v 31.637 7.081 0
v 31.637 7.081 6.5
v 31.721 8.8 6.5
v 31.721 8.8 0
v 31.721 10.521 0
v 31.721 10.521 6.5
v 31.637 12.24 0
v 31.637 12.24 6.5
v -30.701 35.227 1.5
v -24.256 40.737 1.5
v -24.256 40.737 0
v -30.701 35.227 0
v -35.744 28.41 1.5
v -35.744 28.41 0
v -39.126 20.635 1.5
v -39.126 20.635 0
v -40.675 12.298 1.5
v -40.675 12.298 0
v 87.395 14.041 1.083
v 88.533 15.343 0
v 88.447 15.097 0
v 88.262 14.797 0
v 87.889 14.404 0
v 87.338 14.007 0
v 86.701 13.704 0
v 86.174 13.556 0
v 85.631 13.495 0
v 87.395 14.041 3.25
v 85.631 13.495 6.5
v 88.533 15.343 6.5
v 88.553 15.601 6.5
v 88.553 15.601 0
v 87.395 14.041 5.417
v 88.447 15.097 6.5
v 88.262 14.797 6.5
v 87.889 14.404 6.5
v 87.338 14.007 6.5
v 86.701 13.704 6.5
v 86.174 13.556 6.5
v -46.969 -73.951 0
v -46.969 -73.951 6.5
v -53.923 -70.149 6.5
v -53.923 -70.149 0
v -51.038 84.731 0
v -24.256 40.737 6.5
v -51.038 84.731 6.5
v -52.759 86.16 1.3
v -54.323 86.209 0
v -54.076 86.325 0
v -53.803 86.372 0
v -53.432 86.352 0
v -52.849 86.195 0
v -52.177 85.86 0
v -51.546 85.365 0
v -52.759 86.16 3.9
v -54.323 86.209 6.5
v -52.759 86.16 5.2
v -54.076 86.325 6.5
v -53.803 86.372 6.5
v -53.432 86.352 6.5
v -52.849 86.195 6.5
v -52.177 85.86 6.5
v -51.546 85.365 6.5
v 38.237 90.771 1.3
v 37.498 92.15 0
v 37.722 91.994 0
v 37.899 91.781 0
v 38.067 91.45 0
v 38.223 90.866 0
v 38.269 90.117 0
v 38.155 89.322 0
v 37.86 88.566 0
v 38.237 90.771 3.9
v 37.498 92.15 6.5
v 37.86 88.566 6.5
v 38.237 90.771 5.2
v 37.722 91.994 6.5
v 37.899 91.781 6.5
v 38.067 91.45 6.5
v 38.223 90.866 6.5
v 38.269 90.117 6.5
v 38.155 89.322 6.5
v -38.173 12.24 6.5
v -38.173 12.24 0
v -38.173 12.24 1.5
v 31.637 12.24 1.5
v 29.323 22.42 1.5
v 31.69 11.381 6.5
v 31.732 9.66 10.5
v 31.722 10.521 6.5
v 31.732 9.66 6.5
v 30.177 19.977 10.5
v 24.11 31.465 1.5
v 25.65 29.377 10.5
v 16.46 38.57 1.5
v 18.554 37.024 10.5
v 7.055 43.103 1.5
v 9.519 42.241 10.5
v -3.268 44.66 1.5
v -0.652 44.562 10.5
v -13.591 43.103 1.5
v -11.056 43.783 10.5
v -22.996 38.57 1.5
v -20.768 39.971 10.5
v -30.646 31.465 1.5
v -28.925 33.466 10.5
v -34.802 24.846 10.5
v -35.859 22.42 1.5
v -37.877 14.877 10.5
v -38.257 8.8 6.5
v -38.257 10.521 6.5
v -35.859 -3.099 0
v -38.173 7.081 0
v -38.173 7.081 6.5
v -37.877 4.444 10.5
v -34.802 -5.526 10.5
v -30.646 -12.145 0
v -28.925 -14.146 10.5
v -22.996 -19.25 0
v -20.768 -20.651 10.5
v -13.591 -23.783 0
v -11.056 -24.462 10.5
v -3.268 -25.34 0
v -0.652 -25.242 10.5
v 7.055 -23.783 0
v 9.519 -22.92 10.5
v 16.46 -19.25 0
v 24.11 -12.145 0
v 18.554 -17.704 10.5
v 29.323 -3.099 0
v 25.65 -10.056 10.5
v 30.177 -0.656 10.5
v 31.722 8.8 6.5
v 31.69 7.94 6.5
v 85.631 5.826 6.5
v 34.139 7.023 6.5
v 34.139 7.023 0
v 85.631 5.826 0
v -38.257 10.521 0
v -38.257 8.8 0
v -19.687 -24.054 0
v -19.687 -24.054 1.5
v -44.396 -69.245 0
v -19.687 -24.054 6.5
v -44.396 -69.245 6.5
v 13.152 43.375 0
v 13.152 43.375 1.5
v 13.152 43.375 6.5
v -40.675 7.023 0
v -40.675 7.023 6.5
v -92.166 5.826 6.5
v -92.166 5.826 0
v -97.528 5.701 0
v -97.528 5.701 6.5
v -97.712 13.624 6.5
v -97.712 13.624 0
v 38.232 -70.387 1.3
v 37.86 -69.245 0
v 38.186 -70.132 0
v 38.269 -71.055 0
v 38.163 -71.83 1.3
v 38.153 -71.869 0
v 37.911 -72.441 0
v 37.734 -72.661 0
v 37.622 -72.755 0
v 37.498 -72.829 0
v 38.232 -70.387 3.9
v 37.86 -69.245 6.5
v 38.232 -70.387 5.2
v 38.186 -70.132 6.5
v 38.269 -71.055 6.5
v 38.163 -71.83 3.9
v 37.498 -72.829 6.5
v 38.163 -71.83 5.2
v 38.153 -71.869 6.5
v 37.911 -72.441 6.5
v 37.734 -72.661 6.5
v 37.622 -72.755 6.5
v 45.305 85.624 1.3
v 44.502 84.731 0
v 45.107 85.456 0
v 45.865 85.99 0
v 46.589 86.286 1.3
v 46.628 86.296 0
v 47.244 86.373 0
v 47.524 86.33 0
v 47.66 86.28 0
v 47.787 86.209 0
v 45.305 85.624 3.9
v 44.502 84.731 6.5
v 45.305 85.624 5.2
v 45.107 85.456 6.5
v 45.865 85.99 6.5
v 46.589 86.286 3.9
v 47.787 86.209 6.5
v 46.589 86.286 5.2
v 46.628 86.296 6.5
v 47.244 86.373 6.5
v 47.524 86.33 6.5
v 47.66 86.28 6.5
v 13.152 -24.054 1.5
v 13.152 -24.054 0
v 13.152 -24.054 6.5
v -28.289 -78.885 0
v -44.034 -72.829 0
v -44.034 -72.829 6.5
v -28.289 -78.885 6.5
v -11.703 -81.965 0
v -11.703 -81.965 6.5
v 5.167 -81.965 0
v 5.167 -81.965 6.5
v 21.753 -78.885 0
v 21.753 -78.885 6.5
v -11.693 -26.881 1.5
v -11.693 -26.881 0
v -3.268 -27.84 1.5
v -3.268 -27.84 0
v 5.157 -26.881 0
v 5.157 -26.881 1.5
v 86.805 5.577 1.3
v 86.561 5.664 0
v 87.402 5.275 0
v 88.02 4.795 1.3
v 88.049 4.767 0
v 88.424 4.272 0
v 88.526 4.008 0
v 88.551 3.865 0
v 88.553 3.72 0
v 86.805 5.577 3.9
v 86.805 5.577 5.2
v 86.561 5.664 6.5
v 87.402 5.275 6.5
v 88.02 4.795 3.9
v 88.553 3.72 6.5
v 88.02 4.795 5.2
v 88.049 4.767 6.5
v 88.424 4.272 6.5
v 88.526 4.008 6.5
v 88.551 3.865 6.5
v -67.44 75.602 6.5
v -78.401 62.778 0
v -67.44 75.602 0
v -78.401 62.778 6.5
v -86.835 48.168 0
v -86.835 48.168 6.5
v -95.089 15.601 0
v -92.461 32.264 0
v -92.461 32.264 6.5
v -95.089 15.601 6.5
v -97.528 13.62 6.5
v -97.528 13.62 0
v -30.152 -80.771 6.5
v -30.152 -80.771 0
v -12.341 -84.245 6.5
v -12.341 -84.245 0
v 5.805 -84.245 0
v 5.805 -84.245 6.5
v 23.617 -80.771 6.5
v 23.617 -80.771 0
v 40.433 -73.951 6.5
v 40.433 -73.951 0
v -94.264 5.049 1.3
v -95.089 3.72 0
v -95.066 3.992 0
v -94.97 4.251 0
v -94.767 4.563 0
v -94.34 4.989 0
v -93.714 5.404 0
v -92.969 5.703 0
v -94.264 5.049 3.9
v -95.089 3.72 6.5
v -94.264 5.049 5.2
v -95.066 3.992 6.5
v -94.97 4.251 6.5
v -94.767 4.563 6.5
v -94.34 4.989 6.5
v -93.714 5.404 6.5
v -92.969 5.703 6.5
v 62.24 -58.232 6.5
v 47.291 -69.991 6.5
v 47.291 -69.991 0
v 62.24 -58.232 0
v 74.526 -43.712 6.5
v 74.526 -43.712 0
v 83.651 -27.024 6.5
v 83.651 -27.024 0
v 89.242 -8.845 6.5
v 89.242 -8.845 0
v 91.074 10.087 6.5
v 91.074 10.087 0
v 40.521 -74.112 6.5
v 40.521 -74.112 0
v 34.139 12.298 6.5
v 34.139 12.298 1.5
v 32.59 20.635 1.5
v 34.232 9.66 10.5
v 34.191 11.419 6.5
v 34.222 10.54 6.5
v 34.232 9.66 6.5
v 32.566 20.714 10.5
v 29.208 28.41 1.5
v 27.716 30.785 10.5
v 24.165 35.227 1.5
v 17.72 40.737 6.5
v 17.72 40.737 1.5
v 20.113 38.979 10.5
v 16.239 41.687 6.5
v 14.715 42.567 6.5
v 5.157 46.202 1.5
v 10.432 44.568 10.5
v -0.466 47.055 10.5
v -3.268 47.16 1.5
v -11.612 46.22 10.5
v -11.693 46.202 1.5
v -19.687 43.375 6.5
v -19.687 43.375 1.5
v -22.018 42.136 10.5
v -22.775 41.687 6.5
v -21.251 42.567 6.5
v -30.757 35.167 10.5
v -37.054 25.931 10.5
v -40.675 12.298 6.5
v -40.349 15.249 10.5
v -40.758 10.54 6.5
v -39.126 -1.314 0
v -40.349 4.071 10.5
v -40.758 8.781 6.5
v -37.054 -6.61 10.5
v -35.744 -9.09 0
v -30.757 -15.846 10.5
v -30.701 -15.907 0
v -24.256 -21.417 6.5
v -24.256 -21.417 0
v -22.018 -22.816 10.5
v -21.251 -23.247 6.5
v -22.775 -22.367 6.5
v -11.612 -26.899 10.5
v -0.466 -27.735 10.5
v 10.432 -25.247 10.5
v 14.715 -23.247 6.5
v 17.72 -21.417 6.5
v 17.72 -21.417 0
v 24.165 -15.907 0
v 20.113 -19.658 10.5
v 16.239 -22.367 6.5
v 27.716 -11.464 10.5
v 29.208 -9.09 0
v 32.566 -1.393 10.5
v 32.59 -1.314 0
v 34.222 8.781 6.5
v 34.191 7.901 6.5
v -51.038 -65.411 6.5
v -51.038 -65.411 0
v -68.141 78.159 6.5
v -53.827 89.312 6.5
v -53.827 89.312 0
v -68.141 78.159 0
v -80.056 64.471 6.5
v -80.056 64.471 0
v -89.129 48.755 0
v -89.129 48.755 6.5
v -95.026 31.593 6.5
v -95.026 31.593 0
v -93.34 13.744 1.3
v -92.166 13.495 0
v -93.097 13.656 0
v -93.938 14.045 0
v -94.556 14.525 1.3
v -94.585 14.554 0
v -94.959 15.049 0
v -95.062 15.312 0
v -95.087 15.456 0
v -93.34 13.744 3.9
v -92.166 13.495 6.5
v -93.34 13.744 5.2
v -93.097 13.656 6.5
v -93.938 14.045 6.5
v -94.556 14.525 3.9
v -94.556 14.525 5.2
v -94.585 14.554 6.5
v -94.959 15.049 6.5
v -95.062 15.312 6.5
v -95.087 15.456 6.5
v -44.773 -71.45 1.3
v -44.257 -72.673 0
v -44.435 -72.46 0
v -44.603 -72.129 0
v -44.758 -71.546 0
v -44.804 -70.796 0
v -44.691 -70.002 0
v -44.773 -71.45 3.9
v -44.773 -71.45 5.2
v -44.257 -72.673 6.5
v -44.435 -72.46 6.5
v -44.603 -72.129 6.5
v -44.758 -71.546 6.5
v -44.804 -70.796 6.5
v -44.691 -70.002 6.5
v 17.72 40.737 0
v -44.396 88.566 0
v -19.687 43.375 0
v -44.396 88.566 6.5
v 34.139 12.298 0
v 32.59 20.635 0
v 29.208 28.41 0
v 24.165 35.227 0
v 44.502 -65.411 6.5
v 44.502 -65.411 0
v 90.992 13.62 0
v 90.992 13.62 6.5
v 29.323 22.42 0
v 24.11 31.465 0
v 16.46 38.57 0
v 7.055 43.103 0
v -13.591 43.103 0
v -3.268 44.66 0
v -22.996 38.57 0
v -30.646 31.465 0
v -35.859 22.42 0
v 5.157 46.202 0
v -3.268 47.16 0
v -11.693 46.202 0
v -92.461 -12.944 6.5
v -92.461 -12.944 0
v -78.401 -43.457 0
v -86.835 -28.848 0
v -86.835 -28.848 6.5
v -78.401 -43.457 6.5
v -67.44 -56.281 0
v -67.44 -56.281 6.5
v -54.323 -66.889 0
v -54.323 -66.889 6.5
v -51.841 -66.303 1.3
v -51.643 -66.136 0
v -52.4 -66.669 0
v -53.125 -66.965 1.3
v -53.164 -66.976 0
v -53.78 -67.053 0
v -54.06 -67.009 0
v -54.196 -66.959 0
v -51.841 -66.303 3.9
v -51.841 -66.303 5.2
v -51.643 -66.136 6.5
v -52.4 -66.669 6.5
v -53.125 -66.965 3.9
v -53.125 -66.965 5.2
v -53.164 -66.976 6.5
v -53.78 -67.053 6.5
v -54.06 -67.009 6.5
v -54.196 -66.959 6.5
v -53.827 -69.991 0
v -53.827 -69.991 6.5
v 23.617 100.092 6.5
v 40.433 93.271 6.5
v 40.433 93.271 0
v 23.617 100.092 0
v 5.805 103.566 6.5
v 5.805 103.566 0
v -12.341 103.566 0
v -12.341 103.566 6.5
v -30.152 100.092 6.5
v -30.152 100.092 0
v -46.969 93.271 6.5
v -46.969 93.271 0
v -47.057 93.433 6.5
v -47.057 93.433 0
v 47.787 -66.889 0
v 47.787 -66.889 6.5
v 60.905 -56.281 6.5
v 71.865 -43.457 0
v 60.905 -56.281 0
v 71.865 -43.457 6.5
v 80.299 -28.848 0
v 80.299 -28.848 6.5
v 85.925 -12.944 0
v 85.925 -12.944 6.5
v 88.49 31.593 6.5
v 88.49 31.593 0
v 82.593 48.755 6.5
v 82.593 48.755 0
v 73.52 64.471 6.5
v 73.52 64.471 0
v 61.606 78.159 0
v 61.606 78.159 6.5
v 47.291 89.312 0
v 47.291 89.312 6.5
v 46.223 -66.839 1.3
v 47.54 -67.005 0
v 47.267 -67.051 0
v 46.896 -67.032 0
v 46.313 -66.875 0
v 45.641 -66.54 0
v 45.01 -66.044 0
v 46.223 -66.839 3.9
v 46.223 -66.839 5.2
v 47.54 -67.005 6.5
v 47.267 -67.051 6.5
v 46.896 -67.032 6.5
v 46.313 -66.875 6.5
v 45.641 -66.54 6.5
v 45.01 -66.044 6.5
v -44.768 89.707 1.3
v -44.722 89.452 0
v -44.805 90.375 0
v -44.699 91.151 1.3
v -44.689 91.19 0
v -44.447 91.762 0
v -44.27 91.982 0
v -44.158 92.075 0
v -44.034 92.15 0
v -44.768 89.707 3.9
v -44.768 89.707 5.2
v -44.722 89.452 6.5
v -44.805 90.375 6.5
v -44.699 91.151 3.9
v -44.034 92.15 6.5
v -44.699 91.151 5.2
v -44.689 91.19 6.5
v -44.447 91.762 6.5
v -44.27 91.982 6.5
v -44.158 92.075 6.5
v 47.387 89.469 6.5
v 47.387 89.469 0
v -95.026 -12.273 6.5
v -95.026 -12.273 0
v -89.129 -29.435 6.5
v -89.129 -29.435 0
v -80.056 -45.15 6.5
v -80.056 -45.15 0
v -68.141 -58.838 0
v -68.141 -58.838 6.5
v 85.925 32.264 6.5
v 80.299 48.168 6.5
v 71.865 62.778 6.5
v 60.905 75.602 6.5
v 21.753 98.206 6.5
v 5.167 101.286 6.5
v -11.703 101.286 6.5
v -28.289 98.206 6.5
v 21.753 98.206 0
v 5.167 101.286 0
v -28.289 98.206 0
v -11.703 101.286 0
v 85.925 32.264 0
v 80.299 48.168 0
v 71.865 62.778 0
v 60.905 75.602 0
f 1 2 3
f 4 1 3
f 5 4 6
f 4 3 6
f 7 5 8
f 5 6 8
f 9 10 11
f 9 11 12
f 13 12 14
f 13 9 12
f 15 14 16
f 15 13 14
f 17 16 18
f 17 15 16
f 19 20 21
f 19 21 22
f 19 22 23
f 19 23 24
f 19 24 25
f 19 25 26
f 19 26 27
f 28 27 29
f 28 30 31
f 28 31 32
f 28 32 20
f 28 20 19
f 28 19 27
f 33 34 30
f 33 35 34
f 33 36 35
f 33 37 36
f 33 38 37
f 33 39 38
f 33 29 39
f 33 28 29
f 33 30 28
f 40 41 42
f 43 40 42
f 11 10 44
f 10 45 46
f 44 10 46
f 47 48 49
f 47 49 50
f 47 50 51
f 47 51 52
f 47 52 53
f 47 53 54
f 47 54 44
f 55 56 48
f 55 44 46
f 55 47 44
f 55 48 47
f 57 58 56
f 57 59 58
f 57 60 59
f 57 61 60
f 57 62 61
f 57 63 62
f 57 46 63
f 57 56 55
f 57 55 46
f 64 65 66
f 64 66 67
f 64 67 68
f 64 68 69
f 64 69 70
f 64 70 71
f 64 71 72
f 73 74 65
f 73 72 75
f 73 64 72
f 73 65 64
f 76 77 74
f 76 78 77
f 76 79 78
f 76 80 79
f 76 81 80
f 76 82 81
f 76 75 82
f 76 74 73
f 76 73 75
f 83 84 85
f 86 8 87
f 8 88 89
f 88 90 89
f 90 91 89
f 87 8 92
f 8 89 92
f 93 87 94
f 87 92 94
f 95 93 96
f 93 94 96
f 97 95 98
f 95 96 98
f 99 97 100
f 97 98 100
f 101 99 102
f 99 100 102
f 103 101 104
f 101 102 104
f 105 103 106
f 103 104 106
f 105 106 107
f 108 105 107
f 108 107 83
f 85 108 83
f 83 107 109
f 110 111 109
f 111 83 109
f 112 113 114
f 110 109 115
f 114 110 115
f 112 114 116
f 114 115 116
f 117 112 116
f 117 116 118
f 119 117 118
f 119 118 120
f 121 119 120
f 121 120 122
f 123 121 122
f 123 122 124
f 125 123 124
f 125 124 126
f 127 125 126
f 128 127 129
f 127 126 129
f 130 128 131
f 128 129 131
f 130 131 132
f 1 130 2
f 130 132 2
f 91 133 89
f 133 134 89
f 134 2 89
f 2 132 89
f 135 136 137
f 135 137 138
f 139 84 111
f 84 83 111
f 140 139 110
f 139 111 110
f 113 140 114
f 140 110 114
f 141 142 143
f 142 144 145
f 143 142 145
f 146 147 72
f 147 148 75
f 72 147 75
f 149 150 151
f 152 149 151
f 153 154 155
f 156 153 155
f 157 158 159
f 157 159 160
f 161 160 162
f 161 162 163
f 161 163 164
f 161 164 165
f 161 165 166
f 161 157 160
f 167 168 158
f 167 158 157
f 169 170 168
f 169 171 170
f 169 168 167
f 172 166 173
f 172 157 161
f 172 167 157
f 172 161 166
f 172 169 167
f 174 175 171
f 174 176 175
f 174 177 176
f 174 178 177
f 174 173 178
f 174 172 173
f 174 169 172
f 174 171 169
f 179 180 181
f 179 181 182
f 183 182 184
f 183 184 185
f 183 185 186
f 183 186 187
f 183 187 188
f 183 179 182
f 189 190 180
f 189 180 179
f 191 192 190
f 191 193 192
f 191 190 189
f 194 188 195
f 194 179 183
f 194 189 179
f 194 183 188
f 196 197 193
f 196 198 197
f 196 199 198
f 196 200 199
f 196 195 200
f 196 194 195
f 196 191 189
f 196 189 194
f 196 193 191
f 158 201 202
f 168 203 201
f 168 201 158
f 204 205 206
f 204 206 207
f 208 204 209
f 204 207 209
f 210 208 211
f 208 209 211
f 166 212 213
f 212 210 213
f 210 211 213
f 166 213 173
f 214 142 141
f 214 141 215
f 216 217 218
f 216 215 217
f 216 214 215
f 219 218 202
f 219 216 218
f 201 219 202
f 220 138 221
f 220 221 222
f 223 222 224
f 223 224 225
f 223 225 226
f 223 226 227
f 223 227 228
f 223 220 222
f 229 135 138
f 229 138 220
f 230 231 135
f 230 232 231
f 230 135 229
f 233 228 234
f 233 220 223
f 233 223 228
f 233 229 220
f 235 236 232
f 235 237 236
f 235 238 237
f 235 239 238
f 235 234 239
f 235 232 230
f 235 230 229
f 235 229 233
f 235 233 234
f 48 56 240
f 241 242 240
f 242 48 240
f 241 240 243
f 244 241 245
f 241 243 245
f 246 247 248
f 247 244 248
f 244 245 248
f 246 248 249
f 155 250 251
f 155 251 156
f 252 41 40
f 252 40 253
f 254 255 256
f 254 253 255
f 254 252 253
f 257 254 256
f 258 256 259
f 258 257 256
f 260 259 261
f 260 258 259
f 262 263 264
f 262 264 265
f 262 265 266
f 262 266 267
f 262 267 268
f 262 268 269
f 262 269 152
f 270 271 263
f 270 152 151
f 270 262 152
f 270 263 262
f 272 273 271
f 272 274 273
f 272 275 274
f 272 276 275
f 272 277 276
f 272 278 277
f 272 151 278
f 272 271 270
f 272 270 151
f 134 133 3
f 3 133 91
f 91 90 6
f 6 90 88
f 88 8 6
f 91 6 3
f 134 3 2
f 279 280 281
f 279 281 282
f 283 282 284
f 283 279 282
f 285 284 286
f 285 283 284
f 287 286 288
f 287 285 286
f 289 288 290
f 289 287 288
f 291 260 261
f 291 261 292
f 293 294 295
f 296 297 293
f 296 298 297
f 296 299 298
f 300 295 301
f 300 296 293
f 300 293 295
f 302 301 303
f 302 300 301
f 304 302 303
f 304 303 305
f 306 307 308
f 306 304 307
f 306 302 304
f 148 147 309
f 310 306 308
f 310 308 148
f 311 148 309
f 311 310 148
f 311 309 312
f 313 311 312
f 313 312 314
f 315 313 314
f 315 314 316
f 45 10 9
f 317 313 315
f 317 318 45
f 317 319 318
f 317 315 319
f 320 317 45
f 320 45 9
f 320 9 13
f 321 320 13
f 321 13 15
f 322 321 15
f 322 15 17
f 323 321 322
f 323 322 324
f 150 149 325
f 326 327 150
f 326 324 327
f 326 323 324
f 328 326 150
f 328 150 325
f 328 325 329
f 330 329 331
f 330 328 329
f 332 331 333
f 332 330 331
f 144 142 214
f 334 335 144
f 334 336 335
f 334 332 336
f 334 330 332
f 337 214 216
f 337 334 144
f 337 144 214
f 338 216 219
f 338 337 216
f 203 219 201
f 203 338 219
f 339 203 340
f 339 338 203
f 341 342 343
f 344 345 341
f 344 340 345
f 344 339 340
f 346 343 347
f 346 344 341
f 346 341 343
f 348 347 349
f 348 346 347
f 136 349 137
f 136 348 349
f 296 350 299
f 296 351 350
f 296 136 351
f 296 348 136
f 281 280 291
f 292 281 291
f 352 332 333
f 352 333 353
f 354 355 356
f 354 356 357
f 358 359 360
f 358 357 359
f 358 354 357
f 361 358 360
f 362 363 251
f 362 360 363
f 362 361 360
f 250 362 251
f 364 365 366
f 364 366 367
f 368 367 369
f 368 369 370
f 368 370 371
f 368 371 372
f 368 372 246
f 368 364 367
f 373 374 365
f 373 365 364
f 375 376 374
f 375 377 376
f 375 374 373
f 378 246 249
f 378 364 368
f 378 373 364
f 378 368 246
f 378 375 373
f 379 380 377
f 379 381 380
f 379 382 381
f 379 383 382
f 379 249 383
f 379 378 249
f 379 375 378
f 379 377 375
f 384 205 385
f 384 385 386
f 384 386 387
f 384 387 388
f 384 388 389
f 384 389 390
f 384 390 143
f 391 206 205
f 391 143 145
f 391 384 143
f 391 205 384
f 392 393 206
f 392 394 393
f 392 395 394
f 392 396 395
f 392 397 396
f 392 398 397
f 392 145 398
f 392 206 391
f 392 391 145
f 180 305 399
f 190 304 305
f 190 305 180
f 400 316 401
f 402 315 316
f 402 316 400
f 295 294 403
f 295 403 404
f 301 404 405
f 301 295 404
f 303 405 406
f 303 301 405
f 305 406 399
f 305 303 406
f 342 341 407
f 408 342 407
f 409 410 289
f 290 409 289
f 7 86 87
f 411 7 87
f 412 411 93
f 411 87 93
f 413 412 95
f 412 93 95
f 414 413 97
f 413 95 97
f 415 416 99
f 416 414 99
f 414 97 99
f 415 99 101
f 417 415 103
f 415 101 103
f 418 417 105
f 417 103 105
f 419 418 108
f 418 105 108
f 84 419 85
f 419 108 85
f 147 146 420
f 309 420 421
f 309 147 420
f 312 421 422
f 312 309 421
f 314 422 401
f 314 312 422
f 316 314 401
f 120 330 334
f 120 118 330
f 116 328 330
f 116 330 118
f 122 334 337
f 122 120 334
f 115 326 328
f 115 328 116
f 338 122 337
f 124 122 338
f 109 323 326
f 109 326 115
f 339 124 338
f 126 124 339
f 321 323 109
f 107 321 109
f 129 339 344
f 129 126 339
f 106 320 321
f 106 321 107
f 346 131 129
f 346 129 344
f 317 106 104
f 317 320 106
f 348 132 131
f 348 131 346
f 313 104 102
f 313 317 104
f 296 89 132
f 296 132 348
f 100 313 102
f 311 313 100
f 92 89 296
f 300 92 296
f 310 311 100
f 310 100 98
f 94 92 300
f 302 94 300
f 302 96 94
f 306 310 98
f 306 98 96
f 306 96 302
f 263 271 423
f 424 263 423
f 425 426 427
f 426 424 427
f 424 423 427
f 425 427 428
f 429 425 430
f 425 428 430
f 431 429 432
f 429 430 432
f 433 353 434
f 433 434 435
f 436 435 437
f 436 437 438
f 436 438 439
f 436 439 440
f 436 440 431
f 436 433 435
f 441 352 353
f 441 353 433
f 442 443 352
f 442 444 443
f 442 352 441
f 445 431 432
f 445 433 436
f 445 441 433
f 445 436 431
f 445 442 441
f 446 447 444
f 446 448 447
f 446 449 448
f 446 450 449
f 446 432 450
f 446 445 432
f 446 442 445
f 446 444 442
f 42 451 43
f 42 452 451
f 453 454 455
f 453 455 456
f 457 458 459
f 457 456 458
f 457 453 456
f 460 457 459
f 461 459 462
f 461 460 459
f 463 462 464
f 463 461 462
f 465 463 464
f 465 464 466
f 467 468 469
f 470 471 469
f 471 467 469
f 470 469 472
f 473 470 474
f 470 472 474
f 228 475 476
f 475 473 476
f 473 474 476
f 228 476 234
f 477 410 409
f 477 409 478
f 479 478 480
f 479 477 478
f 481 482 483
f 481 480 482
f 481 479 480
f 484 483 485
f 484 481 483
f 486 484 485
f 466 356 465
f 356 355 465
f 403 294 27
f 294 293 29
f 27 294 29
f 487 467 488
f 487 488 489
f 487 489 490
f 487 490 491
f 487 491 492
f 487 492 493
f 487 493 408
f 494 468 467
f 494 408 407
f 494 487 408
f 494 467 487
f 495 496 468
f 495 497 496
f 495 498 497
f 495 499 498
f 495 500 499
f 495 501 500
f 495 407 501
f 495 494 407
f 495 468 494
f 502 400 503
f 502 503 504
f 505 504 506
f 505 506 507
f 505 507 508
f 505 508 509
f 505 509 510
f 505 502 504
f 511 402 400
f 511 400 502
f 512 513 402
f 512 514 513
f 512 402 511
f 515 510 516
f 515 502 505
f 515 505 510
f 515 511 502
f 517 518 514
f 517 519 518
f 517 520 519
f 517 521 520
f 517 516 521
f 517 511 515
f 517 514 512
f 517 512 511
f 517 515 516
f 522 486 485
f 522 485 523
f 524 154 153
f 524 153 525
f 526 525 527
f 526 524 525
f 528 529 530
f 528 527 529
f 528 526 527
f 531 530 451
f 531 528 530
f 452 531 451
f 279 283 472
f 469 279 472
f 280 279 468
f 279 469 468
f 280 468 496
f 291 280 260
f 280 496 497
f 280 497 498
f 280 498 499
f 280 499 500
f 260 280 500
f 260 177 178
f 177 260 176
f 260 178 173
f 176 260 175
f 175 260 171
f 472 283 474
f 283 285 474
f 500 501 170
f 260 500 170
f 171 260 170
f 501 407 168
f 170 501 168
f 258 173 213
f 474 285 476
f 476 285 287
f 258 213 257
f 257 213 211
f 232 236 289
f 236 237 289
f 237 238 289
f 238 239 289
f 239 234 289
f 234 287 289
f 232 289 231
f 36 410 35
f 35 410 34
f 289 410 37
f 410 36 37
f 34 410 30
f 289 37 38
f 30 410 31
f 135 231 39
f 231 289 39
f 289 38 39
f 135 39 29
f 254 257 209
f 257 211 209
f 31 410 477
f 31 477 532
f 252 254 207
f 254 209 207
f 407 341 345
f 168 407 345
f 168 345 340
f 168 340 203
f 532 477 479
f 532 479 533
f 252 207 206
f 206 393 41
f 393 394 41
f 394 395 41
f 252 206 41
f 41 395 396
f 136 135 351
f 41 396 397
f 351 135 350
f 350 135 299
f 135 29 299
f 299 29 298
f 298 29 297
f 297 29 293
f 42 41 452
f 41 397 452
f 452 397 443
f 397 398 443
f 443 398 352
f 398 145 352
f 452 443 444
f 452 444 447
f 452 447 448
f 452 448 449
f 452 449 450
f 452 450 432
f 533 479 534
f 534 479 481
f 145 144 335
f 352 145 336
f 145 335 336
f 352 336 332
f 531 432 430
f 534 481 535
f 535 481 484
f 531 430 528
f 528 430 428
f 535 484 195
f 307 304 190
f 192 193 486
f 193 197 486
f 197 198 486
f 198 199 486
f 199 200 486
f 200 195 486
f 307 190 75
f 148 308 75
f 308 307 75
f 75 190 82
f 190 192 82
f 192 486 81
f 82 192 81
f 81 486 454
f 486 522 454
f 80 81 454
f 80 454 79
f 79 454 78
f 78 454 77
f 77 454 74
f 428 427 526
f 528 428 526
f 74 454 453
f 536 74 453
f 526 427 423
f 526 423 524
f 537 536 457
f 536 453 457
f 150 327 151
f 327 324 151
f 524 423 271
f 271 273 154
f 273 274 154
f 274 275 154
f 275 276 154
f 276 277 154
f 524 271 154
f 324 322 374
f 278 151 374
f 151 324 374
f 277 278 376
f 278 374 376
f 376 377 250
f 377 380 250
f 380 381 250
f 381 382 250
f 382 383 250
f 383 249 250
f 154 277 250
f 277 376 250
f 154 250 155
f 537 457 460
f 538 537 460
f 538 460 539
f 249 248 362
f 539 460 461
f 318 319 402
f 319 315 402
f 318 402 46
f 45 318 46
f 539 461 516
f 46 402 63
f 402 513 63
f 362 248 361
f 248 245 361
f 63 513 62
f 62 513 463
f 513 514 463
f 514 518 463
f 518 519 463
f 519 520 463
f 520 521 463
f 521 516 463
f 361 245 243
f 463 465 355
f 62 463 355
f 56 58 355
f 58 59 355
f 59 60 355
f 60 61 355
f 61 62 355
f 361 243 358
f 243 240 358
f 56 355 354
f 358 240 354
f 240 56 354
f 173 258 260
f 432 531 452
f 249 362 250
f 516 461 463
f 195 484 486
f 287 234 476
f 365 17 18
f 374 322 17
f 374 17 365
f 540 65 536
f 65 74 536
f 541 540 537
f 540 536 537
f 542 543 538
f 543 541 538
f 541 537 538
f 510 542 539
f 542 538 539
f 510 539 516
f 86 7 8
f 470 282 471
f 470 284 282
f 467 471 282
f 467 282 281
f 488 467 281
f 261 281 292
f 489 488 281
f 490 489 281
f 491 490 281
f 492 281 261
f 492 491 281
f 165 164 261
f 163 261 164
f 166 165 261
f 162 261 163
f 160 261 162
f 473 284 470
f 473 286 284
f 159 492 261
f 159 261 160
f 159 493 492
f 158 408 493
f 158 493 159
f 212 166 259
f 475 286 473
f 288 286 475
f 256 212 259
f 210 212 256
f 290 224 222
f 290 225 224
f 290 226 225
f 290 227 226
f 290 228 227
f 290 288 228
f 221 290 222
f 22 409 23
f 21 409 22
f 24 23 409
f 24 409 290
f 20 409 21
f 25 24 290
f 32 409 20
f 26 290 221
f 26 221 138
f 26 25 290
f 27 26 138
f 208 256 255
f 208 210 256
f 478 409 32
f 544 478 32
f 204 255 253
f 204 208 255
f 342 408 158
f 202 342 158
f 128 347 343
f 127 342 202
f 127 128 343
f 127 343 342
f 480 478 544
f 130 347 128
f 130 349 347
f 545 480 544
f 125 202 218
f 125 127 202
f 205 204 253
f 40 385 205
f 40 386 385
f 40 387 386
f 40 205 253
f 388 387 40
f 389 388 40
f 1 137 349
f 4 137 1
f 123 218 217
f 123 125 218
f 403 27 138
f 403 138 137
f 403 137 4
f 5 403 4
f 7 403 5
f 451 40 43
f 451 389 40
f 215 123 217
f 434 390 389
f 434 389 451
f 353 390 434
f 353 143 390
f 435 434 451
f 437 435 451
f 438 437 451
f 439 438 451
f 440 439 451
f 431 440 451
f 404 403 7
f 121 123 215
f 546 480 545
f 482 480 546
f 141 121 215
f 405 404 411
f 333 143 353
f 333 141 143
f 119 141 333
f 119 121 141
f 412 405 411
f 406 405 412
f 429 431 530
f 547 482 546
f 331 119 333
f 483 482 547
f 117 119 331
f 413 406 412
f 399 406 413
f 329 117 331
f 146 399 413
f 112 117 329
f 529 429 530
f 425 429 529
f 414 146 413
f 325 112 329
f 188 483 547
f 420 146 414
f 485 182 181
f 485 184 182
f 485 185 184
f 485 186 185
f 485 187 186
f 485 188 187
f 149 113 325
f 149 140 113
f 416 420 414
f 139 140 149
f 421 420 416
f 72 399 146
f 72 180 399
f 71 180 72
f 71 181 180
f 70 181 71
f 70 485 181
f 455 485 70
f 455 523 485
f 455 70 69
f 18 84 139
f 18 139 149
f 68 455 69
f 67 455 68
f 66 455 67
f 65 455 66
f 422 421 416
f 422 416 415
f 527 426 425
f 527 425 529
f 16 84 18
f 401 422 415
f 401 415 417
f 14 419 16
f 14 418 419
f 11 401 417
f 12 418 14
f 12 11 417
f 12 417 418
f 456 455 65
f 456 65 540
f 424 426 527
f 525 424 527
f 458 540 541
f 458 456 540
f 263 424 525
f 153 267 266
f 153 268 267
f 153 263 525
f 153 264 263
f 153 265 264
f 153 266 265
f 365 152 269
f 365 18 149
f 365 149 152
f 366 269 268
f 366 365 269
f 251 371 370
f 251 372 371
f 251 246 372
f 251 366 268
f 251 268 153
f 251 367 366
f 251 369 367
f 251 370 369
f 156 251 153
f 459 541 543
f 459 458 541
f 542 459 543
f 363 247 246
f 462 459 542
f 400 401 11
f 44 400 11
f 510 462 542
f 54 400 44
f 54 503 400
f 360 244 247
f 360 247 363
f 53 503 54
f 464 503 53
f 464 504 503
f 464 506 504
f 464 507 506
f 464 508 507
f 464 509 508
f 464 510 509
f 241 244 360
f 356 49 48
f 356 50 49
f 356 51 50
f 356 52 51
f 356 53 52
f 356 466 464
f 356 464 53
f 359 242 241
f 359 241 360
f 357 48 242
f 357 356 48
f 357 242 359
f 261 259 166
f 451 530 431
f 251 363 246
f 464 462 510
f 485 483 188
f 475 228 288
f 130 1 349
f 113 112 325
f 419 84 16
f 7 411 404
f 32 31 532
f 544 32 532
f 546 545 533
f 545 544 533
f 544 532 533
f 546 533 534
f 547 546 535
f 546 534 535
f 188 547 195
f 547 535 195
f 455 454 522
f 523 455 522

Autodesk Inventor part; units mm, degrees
ref_plane "Work Plane1" through (6.7321, 7.6603, 6.5) normal (0, 0, -1) x (-1, 0, 0)
ref_plane "Work Plane2" through (-91.9966, 5.6978, 0) normal (0, 0, 1) x (1, 0, 0)
sketch "Sketch2" plane through (6.7321, 7.6603, 6.5) normal (0, 0, -1) x (-1, 0, 0)
  arc A0 (-24.9048, 4.5792) -> (-24.9048, -0.5792) centre (10, 2) ccw projected
  line L0 (-24.9048, 4.5792) -> (-78.8985, 5.8348) projected
  spline S0 degree 3 poles (-81.8209, 7.9406) (-81.8261, 7.8611) (-81.8206, 7.7825) (-81.7897, 7.6241) (-81.7641, 7.5464) (-81.6606, 7.31) (-81.5548, 7.1589) (-81.2411, 6.7962) (-80.9721, 6.571) (-80.3946, 6.2158) (-80.1028, 6.0812) (-79.5089, 5.8959) (-79.2045, 5.842) (-78.8985, 5.8348) knots 0 0 0 0 0.0239 0.0239 0.048426 0.048426 0.101393 0.101393 0.192693 0.192693 0.27175 0.27175 0.348512 0.348512 0.348512 0.348512 projected
  arc A1 (-41.0552, 78.5489) -> (-81.8209, 7.9406) centre (10, 2) ccw projected
  spline S1 degree 3 poles (-37.7703, 77.0709) (-37.9792, 77.4141) (-38.2566, 77.7144) (-38.9885, 78.2905) (-39.4509, 78.5125) (-40.0652, 78.6833) (-40.2919, 78.7218) (-40.6062, 78.7092) (-40.7048, 78.6952) (-40.8909, 78.6405) (-40.9762, 78.6017) (-41.0552, 78.5489) knots 0 0 0 0 0.120544 0.120544 0.279074 0.279074 0.360181 0.360181 0.397351 0.397351 0.43301 0.43301 0.43301 0.43301 projected
  line L1 (-9.6861, 30.9389) -> (-37.7703, 77.0709) projected
  arc A2 (-5.2188, 33.5181) -> (-9.6861, 30.9389) centre (10, 2) ccw projected
  line L2 (-5.2188, 33.5181) -> (-31.1282, 80.9057) projected
  spline S2 degree 3 poles (-30.7657, 84.4896) (-30.8731, 84.4365) (-30.9658, 84.364) (-31.1483, 84.1647) (-31.2278, 84.0319) (-31.3942, 83.6678) (-31.4659, 83.3963) (-31.5524, 82.7609) (-31.5541, 82.3658) (-31.4249, 81.594) (-31.3074, 81.2336) (-31.1282, 80.9057) knots 0 0 0 0 0.035944 0.035944 0.08118 0.08118 0.156549 0.156549 0.248753 0.248753 0.333217 0.333217 0.333217 0.333217 projected
  arc A3 (50.7657, 84.4896) -> (-30.7657, 84.4896) centre (10, 2) ccw projected
  spline S3 degree 3 poles (51.1282, 80.9057) (51.3209, 81.2583) (51.4423, 81.6486) (51.5753, 82.5706) (51.5364, 83.082) (51.3771, 83.6993) (51.2971, 83.9149) (51.129, 84.1809) (51.0676, 84.2592) (50.9272, 84.393) (50.8509, 84.4475) (50.7657, 84.4896) knots 0 0 0 0 0.120544 0.120544 0.279074 0.279074 0.360181 0.360181 0.397351 0.397351 0.43301 0.43301 0.43301 0.43301 projected
  line L3 (25.2188, 33.5181) -> (51.1282, 80.9057) projected
  arc A4 (29.6861, 30.9389) -> (25.2188, 33.5181) centre (10, 2) ccw projected
  line L4 (29.6861, 30.9389) -> (57.7703, 77.0709) projected
  spline S4 degree 3 poles (61.0552, 78.5489) (60.9555, 78.6154) (60.8464, 78.6595) (60.5826, 78.7178) (60.4278, 78.7203) (60.0293, 78.6823) (59.7583, 78.6087) (59.1648, 78.3659) (58.8217, 78.1698) (58.218, 77.672) (57.9646, 77.39) (57.7703, 77.0709) knots 0 0 0 0 0.035944 0.035944 0.08118 0.08118 0.156549 0.156549 0.248753 0.248753 0.333217 0.333217 0.333217 0.333217 projected
  arc A5 (101.8209, 7.9406) -> (61.0552, 78.5489) centre (10, 2) ccw projected
  spline S5 degree 3 poles (98.8985, 5.8348) (99.3002, 5.8442) (99.6989, 5.9342) (100.5638, 6.28) (100.9872, 6.5694) (101.4422, 7.0161) (101.5889, 7.1931) (101.7352, 7.4717) (101.7724, 7.564) (101.8181, 7.7525) (101.8271, 7.8458) (101.8209, 7.9406) knots 0 0 0 0 0.120544 0.120544 0.279074 0.279074 0.360181 0.360181 0.397351 0.397351 0.43301 0.43301 0.43301 0.43301 projected
  line L5 (44.9048, 4.5792) -> (98.8985, 5.8348) projected
  arc A6 (44.9048, -0.5792) -> (44.9048, 4.5792) centre (10, 2) ccw projected
  line L6 (44.9048, -0.5792) -> (98.8985, -1.8348) projected
  spline S6 degree 3 poles (101.8209, -3.9406) (101.8287, -3.8211) (101.8123, -3.7046) (101.7308, -3.4469) (101.6557, -3.3116) (101.4235, -2.9855) (101.2242, -2.7876) (100.7172, -2.395) (100.3759, -2.196) (99.6429, -1.922) (99.272, -1.8435) (98.8985, -1.8348) knots 0 0 0 0 0.035944 0.035944 0.08118 0.08118 0.156549 0.156549 0.248753 0.248753 0.333217 0.333217 0.333217 0.333217 projected
  arc A7 (61.0552, -74.5489) -> (101.8209, -3.9406) centre (10, 2) ccw projected
  spline S7 degree 3 poles (57.7703, -73.0709) (57.9792, -73.4141) (58.2566, -73.7144) (58.9885, -74.2905) (59.4509, -74.5125) (60.0652, -74.6833) (60.2919, -74.7218) (60.6062, -74.7092) (60.7048, -74.6952) (60.8909, -74.6405) (60.9762, -74.6017) (61.0552, -74.5489) knots 0 0 0 0 0.120544 0.120544 0.279074 0.279074 0.360181 0.360181 0.397351 0.397351 0.43301 0.43301 0.43301 0.43301 projected
  line L7 (29.6861, -26.9389) -> (57.7703, -73.0709) projected
  arc A8 (25.2188, -29.5181) -> (29.6861, -26.9389) centre (10, 2) ccw projected
  line L8 (25.2188, -29.5181) -> (51.1282, -76.9057) projected
  spline S8 degree 3 poles (50.7657, -80.4896) (50.8731, -80.4365) (50.9658, -80.364) (51.1483, -80.1647) (51.2278, -80.0319) (51.3942, -79.6678) (51.4659, -79.3963) (51.5524, -78.7609) (51.5541, -78.3658) (51.4249, -77.594) (51.3074, -77.2336) (51.1282, -76.9057) knots 0 0 0 0 0.035944 0.035944 0.08118 0.08118 0.156549 0.156549 0.248753 0.248753 0.333217 0.333217 0.333217 0.333217 projected
  arc A9 (-30.7657, -80.4896) -> (50.7657, -80.4896) centre (10, 2) ccw projected
  spline S9 degree 3 poles (-31.1282, -76.9057) (-31.3209, -77.2583) (-31.4423, -77.6486) (-31.5753, -78.5706) (-31.5364, -79.082) (-31.3771, -79.6993) (-31.2971, -79.9149) (-31.129, -80.1809) (-31.0676, -80.2592) (-30.9272, -80.393) (-30.8509, -80.4475) (-30.7657, -80.4896) knots 0 0 0 0 0.120544 0.120544 0.279074 0.279074 0.360181 0.360181 0.397351 0.397351 0.43301 0.43301 0.43301 0.43301 projected
  line L9 (-5.2188, -29.5181) -> (-31.1282, -76.9057) projected
  arc A10 (-9.6861, -26.9389) -> (-5.2188, -29.5181) centre (10, 2) ccw projected
  line L10 (-9.6861, -26.9389) -> (-37.7703, -73.0709) projected
  spline S10 degree 3 poles (-41.0552, -74.5489) (-40.9555, -74.6154) (-40.8464, -74.6595) (-40.5826, -74.7178) (-40.4278, -74.7203) (-40.0293, -74.6823) (-39.7583, -74.6087) (-39.1648, -74.3659) (-38.8217, -74.1698) (-38.218, -73.672) (-37.9646, -73.39) (-37.7703, -73.0709) knots 0 0 0 0 0.035944 0.035944 0.08118 0.08118 0.156549 0.156549 0.248753 0.248753 0.333217 0.333217 0.333217 0.333217 projected
  arc A11 (-81.8209, -3.9406) -> (-41.0552, -74.5489) centre (10, 2) ccw projected
  spline S11 degree 3 poles (-78.8985, -1.8348) (-79.3002, -1.8442) (-79.6989, -1.9342) (-80.5638, -2.28) (-80.9872, -2.5694) (-81.4422, -3.0161) (-81.5889, -3.1931) (-81.7352, -3.4717) (-81.7724, -3.564) (-81.8181, -3.7525) (-81.8271, -3.8458) (-81.8209, -3.9406) knots 0 0 0 0 0.120544 0.120544 0.279074 0.279074 0.360181 0.360181 0.397351 0.397351 0.43301 0.43301 0.43301 0.43301 projected
  line L11 (-24.9048, -0.5792) -> (-78.8985, -1.8348) projected
  line L12 (-84.2597, 5.9595) -> (-84.3419, 2.4266) projected
  arc A12 (-84.3419, 2.4266) -> (-40.5589, -77.6516) centre (10, 2) ccw projected
  line L13 (-40.5589, -77.6516) -> (-33.7892, -81.7728) projected
  line L14 (-33.7008, -81.6111) -> (-33.7892, -81.7728) projected
  arc A13 (-33.7008, -81.6111) -> (53.7008, -81.6111) centre (10, 2) ccw projected
  line L15 (53.7008, -81.6111) -> (60.6548, -77.809) projected
  line L16 (60.5589, -77.6516) -> (60.6548, -77.809) projected
  arc A14 (60.5589, -77.6516) -> (104.2597, -1.9595) centre (10, 2) ccw projected
  line L17 (104.2597, -1.9595) -> (104.444, 5.9638) projected
  line L18 (104.2597, 5.9595) -> (104.444, 5.9638) projected
  arc A15 (104.2597, 5.9595) -> (60.5589, 81.6516) centre (10, 2) ccw projected
  line L19 (60.5589, 81.6516) -> (53.7892, 85.7728) projected
  line L20 (53.7008, 85.6111) -> (53.7892, 85.7728) projected
  arc A16 (53.7008, 85.6111) -> (-33.7008, 85.6111) centre (10, 2) ccw projected
  line L21 (-33.7008, 85.6111) -> (-40.6548, 81.809) projected
  line L22 (-40.5589, 81.6516) -> (-40.6548, 81.809) projected
  arc A17 (-40.5589, 81.6516) -> (-84.2597, 5.9595) centre (10, 2) ccw projected
  point P0 (6.7321, -7.6603)
extrude "Extrusion1" add sketch "Sketch2" along normal up to surface (6.5 mm away)
ref_plane "Work Plane3" through (-3.2679, 9.6603, 1.5) normal (0, 0, 1) x (1, 0, 0)
sketch "Sketch3" plane through (-3.2679, 9.6603, 1.5) normal (0, 0, 1) x (1, 0, 0)
  circle A0 centre (0, 0) radius 35
  circle A1 centre (0, 0) radius 37.5
  point P0 (3.2679, -9.6603)
  dimension "d2" = 70
  dimension "d3" = 75
ref_plane "Work Plane4" through (11.9508, 38.5991, 10.5) normal (0, 0, 1) x (1, 0, 0)
extrude "Extrusion2" add sketch "Sketch3" along normal up to surface (9 mm away)
sketch "Sketch4" plane through (-3.2679, 9.6603, 1.5) normal (0, 0, -1) x (-1, 0, 0)
  arc A0 (-16.4195, -33.7142) -> (16.4195, -33.7142) centre (0, 0) ccw projected
  circle A1 centre (0, 0) radius 35
  circle A2 centre (0, 0) radius 37.5
  point P0 (-3.2679, -9.6603)
  dimension "d6" = 70
  dimension "d7" = 75
extrude "Extrusion3" add sketch "Sketch4" along normal up to surface (1.5 mm away)
properties part number "Wheel-190D-Join"
